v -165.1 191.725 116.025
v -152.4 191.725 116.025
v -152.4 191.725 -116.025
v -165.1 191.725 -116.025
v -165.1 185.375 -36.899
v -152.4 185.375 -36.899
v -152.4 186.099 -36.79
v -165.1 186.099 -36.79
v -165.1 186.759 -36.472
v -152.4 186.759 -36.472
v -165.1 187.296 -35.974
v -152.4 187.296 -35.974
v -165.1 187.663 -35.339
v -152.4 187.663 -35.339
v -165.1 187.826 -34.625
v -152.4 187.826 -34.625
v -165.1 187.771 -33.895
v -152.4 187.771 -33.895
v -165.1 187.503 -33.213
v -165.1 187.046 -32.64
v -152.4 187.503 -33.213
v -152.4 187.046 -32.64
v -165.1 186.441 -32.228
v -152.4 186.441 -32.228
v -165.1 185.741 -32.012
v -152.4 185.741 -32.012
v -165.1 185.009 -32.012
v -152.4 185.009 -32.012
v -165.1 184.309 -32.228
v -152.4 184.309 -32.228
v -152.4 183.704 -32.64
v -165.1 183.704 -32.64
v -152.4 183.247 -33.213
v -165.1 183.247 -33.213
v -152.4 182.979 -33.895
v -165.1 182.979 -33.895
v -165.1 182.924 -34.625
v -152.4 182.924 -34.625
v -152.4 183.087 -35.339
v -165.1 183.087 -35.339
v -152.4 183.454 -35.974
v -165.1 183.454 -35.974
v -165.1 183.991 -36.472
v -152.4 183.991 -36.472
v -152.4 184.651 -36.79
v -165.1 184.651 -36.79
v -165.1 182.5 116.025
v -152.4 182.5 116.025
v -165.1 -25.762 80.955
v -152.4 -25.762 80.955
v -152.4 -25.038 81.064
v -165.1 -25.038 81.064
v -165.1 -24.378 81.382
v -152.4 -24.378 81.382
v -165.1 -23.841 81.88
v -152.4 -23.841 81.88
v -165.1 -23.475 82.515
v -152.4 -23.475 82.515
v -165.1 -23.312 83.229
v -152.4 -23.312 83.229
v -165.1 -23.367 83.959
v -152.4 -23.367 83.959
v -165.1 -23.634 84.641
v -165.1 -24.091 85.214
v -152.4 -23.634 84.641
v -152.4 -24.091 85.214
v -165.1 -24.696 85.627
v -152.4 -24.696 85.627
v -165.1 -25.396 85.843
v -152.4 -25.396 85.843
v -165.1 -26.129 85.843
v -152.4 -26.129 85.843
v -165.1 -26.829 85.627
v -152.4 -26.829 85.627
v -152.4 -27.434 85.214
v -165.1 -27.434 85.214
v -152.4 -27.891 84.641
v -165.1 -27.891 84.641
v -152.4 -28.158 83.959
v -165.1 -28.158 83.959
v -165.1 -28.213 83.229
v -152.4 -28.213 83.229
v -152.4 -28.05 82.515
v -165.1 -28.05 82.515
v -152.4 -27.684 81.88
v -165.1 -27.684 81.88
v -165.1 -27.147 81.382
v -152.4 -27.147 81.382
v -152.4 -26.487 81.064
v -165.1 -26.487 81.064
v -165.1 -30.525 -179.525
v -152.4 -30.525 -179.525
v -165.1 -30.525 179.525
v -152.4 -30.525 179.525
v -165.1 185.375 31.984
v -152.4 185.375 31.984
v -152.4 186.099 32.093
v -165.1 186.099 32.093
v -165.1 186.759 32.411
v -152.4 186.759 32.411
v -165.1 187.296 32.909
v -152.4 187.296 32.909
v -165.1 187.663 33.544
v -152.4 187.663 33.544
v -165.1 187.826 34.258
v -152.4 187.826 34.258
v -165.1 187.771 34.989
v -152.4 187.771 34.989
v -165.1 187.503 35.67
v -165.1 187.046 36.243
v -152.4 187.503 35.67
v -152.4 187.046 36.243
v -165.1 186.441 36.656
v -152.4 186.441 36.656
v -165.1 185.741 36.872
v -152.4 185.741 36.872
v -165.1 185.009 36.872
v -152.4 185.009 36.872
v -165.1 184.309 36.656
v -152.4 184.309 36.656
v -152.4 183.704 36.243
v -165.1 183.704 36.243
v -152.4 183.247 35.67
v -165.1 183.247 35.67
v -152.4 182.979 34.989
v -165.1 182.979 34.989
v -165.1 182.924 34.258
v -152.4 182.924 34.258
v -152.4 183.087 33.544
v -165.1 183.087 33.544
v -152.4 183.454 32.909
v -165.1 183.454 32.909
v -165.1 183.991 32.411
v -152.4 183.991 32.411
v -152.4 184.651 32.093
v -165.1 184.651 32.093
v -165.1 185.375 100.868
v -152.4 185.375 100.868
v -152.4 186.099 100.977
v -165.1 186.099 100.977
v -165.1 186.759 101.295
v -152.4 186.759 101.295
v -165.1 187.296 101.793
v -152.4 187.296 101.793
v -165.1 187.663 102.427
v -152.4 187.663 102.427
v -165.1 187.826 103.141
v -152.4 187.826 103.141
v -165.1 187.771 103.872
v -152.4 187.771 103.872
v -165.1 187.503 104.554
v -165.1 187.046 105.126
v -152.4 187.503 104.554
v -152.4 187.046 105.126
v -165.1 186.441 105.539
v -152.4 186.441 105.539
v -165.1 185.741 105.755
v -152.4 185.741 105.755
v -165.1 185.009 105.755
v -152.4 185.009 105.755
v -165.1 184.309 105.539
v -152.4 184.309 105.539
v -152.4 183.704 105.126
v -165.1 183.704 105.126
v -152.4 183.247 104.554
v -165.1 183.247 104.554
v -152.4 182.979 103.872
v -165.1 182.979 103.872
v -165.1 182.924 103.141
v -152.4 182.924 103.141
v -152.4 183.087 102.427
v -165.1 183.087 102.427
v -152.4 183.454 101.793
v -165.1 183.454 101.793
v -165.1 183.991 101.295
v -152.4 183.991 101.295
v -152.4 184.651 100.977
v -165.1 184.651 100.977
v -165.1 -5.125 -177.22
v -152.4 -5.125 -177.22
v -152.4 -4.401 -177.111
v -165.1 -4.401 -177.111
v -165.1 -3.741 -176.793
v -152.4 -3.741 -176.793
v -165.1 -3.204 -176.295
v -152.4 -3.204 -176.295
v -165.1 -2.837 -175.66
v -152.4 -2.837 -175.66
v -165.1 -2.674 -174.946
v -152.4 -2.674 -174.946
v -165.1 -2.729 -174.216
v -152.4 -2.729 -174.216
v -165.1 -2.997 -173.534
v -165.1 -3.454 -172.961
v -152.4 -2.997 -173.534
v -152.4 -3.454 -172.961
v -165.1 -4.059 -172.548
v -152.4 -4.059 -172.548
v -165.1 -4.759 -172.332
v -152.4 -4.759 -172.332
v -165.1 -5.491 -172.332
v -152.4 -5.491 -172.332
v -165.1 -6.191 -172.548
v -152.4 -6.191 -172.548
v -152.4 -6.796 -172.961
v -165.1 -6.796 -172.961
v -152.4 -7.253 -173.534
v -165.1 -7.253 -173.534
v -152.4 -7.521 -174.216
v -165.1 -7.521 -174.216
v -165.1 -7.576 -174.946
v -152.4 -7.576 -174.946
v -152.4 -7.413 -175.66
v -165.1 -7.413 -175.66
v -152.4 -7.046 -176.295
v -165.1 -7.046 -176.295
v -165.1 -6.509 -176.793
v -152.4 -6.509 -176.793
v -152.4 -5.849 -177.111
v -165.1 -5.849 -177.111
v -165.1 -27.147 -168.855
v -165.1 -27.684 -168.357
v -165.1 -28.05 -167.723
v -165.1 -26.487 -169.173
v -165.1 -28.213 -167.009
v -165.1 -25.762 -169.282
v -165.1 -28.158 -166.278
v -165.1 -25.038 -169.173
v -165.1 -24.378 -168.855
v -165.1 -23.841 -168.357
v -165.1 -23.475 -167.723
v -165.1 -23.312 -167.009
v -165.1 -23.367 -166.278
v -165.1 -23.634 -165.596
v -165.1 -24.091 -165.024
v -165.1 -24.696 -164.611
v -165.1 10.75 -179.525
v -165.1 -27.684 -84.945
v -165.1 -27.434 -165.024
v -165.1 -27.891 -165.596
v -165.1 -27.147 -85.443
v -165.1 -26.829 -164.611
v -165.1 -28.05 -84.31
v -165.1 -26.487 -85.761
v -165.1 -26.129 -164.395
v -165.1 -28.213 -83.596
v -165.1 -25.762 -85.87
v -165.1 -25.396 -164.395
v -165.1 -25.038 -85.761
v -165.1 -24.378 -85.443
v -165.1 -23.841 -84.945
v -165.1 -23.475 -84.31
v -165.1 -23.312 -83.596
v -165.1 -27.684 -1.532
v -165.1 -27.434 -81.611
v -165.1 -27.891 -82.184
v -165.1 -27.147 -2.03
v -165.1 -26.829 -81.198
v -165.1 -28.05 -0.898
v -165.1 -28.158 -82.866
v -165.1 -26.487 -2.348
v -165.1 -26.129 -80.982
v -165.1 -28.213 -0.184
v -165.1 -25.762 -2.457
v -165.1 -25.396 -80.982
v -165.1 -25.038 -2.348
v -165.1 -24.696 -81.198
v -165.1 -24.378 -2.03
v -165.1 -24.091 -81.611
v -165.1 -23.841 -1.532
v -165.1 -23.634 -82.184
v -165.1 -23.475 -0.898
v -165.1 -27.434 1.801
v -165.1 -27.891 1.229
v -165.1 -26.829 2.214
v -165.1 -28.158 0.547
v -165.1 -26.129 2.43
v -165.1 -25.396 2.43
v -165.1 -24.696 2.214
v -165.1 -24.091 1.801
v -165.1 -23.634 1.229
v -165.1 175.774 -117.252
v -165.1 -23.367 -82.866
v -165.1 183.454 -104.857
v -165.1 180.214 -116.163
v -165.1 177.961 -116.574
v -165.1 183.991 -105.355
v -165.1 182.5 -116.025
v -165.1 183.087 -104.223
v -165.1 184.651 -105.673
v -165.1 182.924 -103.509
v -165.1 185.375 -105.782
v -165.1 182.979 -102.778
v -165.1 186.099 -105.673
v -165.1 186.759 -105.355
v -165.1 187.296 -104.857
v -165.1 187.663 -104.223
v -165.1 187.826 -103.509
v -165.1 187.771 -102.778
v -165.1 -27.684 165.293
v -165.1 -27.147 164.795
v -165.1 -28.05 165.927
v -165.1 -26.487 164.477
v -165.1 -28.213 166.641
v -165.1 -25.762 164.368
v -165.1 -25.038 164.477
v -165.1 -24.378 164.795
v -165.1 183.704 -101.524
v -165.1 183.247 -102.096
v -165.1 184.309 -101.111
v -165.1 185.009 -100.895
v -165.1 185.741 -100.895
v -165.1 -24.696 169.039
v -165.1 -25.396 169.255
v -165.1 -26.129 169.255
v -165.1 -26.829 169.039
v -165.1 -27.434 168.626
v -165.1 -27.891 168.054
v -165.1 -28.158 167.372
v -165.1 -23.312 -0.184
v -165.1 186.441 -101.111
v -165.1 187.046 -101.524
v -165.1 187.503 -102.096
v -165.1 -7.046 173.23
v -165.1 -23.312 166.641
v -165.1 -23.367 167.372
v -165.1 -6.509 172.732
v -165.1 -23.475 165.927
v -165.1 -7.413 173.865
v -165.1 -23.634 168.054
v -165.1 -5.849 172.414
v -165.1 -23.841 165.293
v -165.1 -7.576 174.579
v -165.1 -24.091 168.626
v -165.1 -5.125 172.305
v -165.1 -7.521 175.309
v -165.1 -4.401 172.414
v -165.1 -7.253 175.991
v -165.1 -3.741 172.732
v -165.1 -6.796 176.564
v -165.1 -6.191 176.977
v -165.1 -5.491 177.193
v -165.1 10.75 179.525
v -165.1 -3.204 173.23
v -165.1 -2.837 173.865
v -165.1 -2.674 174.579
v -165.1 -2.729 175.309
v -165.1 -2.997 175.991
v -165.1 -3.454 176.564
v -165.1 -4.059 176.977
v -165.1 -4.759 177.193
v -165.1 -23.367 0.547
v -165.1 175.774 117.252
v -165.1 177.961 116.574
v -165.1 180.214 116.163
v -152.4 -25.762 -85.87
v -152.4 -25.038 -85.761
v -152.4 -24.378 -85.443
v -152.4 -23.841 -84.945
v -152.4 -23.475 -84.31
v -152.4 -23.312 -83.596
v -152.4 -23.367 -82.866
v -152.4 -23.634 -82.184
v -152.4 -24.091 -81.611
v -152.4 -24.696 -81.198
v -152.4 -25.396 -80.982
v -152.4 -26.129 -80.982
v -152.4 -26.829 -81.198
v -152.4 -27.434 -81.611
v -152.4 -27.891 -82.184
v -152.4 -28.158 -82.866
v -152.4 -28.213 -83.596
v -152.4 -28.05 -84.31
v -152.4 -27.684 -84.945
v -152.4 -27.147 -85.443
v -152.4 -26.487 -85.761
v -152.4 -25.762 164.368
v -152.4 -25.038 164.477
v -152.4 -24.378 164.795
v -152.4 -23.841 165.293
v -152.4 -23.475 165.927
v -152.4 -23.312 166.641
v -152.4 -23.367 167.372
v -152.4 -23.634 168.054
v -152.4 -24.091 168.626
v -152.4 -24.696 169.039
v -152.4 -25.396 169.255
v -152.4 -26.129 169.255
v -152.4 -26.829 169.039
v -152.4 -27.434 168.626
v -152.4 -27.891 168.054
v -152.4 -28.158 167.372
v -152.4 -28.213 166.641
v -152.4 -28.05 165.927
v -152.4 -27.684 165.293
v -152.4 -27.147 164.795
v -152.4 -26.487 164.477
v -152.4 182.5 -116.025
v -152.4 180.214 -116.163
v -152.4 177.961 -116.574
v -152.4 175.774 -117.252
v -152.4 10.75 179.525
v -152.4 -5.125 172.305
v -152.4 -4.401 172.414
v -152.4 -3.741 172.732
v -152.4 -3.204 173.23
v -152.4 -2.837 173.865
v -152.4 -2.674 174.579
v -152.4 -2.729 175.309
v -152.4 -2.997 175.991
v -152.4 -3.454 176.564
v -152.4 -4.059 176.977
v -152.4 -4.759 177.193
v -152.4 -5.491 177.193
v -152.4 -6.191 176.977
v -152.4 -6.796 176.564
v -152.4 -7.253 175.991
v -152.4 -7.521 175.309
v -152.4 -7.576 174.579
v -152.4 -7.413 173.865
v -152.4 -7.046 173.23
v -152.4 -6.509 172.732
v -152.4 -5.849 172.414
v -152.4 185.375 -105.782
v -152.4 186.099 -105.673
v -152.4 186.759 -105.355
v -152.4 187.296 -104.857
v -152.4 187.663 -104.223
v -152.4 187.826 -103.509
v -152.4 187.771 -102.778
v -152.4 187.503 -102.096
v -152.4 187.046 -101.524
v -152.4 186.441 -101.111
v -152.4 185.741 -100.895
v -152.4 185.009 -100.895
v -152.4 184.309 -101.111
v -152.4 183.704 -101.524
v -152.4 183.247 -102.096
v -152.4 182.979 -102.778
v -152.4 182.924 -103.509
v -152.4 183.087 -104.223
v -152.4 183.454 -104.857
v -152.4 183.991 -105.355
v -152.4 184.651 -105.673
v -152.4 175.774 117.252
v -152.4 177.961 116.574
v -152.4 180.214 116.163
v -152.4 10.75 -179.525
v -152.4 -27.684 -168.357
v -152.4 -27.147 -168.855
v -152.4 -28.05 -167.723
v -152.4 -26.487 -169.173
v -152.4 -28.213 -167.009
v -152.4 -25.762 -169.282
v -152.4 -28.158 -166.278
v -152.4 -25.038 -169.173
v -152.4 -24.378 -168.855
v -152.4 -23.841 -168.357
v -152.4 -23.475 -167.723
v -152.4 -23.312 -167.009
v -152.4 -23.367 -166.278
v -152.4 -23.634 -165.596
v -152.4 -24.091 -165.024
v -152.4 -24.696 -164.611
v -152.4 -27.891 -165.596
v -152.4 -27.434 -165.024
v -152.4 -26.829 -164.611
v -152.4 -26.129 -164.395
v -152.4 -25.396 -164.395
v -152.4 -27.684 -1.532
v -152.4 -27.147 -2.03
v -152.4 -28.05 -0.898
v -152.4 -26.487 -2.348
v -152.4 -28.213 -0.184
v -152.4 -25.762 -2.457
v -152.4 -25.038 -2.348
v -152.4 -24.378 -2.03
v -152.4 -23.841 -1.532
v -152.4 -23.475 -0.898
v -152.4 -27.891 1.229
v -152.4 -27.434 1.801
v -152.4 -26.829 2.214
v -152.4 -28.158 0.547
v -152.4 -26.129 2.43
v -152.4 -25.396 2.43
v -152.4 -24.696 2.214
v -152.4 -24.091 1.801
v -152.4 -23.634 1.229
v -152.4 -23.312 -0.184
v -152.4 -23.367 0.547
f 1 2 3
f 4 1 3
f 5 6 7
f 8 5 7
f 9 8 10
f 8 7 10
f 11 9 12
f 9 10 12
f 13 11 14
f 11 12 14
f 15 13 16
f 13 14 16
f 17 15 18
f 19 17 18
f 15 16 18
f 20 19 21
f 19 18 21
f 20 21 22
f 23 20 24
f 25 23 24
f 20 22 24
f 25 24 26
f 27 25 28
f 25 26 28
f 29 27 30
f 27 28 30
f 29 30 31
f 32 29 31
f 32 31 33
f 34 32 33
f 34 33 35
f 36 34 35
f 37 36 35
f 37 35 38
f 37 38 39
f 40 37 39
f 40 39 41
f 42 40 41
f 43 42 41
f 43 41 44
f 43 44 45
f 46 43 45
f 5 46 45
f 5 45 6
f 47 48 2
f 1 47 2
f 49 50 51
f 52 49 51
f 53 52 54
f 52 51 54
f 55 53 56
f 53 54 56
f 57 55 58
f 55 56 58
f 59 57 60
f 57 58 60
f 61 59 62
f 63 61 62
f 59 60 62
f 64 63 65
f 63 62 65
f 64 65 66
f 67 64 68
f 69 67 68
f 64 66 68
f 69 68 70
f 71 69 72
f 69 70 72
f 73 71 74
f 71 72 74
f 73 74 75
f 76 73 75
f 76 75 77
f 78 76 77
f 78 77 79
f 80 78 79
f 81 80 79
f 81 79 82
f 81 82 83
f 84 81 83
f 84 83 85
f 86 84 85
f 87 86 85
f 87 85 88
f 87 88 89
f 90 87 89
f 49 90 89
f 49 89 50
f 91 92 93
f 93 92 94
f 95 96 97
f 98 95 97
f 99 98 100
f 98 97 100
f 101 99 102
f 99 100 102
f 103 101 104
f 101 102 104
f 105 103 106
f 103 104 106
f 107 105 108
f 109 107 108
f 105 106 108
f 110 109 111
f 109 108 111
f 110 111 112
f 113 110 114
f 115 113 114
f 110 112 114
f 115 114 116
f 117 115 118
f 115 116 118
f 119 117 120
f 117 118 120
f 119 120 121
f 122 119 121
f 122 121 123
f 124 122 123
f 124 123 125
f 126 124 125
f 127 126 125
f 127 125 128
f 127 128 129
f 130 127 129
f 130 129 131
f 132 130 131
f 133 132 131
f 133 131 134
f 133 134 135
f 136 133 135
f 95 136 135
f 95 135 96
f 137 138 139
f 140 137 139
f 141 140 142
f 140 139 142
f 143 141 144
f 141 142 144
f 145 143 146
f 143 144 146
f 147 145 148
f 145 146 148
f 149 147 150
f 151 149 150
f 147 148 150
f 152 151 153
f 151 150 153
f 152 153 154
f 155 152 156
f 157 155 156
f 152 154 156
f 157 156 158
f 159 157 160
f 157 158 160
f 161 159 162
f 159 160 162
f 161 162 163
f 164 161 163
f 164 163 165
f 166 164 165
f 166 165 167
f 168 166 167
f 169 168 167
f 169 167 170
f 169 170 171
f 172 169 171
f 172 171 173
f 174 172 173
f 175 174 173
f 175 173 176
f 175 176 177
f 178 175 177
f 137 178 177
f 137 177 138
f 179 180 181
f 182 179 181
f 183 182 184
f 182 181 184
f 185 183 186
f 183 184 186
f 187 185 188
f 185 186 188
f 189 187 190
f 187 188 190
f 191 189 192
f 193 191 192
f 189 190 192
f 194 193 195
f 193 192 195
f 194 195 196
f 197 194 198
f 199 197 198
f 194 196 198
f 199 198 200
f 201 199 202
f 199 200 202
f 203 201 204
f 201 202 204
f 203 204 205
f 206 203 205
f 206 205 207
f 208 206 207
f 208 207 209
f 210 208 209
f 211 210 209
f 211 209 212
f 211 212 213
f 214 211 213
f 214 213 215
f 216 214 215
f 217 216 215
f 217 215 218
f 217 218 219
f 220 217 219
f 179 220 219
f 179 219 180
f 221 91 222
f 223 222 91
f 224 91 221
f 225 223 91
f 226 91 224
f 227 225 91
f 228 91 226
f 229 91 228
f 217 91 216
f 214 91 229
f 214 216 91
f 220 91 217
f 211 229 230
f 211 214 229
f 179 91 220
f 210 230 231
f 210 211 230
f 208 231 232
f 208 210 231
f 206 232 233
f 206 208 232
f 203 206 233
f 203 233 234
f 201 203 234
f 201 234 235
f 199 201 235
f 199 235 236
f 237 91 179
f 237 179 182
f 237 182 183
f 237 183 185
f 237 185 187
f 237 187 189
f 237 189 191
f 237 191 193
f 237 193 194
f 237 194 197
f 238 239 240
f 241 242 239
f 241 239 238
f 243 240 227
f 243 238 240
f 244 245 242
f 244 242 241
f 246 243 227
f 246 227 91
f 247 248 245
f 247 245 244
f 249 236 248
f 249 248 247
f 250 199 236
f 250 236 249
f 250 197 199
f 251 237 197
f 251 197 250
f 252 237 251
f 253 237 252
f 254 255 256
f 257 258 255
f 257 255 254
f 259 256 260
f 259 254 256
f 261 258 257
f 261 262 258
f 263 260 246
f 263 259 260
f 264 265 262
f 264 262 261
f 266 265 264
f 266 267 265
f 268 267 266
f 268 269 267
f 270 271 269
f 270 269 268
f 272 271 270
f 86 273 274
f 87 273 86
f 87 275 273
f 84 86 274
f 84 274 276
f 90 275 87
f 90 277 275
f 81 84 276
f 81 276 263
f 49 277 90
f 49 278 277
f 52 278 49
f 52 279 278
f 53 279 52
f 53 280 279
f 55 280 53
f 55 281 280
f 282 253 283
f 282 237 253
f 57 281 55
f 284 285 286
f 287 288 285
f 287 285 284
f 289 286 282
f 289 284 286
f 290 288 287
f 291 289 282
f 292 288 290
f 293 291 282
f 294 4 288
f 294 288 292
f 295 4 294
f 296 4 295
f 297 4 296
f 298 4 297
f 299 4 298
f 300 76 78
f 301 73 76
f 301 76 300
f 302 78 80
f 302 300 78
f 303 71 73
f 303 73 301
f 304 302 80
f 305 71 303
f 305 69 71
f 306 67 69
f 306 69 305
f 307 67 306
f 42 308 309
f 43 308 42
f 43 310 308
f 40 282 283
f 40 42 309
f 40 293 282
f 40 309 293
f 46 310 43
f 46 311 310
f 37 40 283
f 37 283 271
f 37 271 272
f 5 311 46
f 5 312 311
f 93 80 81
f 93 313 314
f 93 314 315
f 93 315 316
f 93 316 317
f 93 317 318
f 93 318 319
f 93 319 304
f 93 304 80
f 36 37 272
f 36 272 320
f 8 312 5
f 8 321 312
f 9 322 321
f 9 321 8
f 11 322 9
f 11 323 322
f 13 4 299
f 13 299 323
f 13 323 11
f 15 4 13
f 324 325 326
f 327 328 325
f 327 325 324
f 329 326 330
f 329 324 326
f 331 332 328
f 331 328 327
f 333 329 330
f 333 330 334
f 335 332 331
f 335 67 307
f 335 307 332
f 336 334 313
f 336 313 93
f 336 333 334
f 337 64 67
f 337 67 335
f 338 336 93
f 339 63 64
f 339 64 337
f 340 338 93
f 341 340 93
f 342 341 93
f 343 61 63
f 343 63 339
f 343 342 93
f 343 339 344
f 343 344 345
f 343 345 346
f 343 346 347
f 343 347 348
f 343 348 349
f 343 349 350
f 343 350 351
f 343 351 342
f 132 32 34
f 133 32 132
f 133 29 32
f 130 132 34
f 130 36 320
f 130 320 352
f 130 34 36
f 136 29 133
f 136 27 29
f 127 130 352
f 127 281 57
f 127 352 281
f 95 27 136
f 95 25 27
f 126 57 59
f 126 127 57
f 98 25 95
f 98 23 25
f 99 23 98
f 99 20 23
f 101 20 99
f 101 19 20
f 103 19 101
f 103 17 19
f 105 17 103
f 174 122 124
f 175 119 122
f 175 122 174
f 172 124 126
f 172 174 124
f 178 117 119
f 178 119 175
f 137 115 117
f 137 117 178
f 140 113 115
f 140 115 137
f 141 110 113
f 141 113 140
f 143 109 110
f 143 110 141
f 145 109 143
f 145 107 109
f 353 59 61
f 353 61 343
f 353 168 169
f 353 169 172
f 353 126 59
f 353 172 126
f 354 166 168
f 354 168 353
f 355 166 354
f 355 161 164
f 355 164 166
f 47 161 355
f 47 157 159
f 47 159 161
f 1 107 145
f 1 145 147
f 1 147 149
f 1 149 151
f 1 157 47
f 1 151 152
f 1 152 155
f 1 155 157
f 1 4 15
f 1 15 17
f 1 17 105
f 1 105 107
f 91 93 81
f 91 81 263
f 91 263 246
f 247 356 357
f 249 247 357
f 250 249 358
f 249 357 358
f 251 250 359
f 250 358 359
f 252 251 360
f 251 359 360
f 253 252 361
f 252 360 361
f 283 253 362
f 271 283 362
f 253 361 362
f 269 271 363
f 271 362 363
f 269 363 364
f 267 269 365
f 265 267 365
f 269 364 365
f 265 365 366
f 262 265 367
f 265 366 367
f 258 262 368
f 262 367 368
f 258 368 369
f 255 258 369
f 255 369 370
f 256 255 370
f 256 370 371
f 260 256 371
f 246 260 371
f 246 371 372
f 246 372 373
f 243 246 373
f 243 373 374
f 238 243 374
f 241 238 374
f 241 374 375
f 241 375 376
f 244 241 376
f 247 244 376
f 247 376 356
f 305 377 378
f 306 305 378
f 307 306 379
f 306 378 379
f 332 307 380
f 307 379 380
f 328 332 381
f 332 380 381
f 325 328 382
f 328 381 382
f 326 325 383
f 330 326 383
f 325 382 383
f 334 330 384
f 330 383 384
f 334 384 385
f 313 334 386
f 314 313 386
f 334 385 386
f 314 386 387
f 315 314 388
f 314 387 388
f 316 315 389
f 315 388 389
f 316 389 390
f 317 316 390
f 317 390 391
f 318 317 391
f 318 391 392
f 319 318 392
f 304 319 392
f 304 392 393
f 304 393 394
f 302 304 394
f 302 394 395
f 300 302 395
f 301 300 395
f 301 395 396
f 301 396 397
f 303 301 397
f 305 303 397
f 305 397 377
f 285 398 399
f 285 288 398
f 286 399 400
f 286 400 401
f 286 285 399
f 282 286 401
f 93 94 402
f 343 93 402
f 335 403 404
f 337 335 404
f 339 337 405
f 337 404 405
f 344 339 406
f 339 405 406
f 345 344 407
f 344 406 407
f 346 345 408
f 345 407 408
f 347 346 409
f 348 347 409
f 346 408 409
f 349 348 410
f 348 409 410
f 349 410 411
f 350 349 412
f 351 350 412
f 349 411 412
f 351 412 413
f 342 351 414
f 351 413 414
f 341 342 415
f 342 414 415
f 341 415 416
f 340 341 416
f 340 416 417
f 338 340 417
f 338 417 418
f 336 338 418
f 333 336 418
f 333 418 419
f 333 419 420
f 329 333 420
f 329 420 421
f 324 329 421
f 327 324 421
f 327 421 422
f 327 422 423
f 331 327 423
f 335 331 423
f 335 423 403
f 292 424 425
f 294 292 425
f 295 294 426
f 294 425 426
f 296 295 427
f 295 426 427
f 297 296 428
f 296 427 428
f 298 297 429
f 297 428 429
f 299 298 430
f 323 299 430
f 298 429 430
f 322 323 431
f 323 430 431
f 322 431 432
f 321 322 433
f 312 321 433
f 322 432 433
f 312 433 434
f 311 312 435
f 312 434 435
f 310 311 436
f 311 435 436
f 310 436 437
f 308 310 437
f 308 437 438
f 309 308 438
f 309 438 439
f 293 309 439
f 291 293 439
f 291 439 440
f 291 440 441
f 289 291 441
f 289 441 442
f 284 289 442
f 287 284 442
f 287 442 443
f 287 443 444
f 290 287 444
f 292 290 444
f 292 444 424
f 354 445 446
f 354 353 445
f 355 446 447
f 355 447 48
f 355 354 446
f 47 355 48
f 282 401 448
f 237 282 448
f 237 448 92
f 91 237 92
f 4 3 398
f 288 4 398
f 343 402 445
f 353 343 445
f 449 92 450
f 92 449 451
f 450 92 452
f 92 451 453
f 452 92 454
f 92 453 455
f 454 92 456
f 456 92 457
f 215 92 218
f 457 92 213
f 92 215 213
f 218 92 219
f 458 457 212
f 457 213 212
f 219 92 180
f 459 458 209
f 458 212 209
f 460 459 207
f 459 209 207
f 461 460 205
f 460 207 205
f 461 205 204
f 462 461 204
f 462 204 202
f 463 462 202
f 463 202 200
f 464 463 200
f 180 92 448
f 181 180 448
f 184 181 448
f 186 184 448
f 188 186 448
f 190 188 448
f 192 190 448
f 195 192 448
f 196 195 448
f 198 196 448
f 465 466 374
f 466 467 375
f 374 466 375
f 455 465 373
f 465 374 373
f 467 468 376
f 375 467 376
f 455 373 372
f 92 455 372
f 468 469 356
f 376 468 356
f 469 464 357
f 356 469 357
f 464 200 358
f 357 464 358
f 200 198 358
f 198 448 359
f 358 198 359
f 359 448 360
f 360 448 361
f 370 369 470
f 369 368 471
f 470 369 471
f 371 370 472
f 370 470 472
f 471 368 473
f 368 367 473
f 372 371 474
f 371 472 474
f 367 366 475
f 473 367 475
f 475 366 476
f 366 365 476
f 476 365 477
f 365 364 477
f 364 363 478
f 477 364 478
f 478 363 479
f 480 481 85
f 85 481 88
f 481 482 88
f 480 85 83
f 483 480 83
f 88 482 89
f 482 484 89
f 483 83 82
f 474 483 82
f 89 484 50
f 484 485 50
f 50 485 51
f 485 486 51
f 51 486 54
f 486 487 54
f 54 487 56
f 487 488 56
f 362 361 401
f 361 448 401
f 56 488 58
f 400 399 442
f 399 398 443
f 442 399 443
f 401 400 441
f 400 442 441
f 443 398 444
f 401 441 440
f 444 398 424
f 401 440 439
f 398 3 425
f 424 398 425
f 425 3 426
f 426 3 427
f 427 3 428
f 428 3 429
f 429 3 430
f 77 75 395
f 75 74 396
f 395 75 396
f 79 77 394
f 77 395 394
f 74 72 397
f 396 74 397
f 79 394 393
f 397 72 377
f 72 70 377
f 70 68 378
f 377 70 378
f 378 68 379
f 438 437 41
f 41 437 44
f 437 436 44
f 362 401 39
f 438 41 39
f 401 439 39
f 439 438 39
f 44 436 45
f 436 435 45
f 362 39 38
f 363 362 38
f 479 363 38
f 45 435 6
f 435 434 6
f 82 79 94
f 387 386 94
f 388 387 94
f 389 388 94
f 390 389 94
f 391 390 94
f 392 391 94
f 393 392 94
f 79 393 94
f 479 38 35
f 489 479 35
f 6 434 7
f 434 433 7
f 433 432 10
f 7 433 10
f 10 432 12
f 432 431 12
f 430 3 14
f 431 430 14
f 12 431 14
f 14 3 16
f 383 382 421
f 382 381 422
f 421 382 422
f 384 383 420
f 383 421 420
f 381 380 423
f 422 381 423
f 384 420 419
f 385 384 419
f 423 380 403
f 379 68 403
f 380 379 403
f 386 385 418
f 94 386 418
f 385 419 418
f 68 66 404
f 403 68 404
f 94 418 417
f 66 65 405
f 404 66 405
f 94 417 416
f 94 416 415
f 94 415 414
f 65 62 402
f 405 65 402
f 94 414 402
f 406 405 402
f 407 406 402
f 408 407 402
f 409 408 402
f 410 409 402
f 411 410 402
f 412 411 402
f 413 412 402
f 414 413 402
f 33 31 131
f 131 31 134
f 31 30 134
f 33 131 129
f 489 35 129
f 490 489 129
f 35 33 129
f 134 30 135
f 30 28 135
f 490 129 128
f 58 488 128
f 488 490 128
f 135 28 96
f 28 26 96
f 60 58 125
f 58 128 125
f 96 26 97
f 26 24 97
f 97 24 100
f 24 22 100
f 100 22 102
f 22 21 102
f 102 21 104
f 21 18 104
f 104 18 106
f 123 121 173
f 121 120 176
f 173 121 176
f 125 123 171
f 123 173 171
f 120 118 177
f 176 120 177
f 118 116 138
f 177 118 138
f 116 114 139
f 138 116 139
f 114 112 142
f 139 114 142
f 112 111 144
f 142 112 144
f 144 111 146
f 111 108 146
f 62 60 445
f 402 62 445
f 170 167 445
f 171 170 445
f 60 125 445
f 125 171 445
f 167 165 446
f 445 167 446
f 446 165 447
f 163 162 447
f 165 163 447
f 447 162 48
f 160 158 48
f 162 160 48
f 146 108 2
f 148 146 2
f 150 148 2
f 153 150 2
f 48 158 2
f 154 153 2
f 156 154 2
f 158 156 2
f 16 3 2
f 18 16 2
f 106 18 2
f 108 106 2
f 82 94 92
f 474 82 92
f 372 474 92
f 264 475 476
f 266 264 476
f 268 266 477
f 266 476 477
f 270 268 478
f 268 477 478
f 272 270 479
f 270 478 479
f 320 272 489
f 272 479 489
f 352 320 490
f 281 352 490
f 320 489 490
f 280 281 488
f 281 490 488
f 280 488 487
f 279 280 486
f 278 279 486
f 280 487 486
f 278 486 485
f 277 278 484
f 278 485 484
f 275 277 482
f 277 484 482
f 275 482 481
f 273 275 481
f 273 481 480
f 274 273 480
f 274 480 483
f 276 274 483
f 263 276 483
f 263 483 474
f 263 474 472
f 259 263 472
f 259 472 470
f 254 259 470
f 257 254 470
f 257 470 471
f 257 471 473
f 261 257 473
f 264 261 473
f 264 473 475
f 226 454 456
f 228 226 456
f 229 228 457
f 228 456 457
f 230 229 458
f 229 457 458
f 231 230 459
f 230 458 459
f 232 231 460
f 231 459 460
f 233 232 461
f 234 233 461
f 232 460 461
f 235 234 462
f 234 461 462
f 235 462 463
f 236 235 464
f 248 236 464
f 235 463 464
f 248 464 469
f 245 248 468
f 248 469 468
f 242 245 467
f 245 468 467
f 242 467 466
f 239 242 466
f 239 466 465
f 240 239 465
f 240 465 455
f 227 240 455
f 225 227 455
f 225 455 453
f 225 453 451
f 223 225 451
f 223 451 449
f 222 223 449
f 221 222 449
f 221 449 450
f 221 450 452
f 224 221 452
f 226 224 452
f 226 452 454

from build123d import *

# Parameters (mm, degrees)
BOSS_EXTRUDE1_DEPTH          = 12.7
FILLET1_R                    = 19.05
F_10_0_1935_DIAMETER_HOLE1_D = 4.9149


with BuildPart() as part:
    # Sketch1 → Boss-Extrude1 (new body)
    with BuildSketch(Plane.ZY.offset(152.399999331)):
        Polygon((179.525, -30.525), (179.525, 10.75), (116.025, 179.025), (116.025, 191.725), (-116.025, 191.725), (-116.025, 179.025), (-179.525, 10.75), (-179.525, -30.525), align=None)
    extrude(amount=BOSS_EXTRUDE1_DEPTH)

    # Fillet1
    fillet1_edges = [part.edges().sort_by_distance(p)[0] for p in [
        (-158.749999331, 179.025, -116.025),
        (-158.749999331, 179.025, 116.025),
    ]]
    fillet(fillet1_edges, radius=FILLET1_R)

    # #10 (0.1935) Diameter Hole1 (through all)
    with Locations(Plane.ZY.offset(165.099999331)):
        with Locations((-103.325, 185.375), (-34.441666667, 185.375), (34.441666667, 185.375), (103.325, 185.375), (174.7625, -5.125), (-174.7625, -5.125), (-166.825, -25.7625), (166.825, -25.7625), (0, -25.7625), (83.4125, -25.7625), (-83.4125, -25.7625)):
            Hole(F_10_0_1935_DIAMETER_HOLE1_D / 2)


solid = part.part
